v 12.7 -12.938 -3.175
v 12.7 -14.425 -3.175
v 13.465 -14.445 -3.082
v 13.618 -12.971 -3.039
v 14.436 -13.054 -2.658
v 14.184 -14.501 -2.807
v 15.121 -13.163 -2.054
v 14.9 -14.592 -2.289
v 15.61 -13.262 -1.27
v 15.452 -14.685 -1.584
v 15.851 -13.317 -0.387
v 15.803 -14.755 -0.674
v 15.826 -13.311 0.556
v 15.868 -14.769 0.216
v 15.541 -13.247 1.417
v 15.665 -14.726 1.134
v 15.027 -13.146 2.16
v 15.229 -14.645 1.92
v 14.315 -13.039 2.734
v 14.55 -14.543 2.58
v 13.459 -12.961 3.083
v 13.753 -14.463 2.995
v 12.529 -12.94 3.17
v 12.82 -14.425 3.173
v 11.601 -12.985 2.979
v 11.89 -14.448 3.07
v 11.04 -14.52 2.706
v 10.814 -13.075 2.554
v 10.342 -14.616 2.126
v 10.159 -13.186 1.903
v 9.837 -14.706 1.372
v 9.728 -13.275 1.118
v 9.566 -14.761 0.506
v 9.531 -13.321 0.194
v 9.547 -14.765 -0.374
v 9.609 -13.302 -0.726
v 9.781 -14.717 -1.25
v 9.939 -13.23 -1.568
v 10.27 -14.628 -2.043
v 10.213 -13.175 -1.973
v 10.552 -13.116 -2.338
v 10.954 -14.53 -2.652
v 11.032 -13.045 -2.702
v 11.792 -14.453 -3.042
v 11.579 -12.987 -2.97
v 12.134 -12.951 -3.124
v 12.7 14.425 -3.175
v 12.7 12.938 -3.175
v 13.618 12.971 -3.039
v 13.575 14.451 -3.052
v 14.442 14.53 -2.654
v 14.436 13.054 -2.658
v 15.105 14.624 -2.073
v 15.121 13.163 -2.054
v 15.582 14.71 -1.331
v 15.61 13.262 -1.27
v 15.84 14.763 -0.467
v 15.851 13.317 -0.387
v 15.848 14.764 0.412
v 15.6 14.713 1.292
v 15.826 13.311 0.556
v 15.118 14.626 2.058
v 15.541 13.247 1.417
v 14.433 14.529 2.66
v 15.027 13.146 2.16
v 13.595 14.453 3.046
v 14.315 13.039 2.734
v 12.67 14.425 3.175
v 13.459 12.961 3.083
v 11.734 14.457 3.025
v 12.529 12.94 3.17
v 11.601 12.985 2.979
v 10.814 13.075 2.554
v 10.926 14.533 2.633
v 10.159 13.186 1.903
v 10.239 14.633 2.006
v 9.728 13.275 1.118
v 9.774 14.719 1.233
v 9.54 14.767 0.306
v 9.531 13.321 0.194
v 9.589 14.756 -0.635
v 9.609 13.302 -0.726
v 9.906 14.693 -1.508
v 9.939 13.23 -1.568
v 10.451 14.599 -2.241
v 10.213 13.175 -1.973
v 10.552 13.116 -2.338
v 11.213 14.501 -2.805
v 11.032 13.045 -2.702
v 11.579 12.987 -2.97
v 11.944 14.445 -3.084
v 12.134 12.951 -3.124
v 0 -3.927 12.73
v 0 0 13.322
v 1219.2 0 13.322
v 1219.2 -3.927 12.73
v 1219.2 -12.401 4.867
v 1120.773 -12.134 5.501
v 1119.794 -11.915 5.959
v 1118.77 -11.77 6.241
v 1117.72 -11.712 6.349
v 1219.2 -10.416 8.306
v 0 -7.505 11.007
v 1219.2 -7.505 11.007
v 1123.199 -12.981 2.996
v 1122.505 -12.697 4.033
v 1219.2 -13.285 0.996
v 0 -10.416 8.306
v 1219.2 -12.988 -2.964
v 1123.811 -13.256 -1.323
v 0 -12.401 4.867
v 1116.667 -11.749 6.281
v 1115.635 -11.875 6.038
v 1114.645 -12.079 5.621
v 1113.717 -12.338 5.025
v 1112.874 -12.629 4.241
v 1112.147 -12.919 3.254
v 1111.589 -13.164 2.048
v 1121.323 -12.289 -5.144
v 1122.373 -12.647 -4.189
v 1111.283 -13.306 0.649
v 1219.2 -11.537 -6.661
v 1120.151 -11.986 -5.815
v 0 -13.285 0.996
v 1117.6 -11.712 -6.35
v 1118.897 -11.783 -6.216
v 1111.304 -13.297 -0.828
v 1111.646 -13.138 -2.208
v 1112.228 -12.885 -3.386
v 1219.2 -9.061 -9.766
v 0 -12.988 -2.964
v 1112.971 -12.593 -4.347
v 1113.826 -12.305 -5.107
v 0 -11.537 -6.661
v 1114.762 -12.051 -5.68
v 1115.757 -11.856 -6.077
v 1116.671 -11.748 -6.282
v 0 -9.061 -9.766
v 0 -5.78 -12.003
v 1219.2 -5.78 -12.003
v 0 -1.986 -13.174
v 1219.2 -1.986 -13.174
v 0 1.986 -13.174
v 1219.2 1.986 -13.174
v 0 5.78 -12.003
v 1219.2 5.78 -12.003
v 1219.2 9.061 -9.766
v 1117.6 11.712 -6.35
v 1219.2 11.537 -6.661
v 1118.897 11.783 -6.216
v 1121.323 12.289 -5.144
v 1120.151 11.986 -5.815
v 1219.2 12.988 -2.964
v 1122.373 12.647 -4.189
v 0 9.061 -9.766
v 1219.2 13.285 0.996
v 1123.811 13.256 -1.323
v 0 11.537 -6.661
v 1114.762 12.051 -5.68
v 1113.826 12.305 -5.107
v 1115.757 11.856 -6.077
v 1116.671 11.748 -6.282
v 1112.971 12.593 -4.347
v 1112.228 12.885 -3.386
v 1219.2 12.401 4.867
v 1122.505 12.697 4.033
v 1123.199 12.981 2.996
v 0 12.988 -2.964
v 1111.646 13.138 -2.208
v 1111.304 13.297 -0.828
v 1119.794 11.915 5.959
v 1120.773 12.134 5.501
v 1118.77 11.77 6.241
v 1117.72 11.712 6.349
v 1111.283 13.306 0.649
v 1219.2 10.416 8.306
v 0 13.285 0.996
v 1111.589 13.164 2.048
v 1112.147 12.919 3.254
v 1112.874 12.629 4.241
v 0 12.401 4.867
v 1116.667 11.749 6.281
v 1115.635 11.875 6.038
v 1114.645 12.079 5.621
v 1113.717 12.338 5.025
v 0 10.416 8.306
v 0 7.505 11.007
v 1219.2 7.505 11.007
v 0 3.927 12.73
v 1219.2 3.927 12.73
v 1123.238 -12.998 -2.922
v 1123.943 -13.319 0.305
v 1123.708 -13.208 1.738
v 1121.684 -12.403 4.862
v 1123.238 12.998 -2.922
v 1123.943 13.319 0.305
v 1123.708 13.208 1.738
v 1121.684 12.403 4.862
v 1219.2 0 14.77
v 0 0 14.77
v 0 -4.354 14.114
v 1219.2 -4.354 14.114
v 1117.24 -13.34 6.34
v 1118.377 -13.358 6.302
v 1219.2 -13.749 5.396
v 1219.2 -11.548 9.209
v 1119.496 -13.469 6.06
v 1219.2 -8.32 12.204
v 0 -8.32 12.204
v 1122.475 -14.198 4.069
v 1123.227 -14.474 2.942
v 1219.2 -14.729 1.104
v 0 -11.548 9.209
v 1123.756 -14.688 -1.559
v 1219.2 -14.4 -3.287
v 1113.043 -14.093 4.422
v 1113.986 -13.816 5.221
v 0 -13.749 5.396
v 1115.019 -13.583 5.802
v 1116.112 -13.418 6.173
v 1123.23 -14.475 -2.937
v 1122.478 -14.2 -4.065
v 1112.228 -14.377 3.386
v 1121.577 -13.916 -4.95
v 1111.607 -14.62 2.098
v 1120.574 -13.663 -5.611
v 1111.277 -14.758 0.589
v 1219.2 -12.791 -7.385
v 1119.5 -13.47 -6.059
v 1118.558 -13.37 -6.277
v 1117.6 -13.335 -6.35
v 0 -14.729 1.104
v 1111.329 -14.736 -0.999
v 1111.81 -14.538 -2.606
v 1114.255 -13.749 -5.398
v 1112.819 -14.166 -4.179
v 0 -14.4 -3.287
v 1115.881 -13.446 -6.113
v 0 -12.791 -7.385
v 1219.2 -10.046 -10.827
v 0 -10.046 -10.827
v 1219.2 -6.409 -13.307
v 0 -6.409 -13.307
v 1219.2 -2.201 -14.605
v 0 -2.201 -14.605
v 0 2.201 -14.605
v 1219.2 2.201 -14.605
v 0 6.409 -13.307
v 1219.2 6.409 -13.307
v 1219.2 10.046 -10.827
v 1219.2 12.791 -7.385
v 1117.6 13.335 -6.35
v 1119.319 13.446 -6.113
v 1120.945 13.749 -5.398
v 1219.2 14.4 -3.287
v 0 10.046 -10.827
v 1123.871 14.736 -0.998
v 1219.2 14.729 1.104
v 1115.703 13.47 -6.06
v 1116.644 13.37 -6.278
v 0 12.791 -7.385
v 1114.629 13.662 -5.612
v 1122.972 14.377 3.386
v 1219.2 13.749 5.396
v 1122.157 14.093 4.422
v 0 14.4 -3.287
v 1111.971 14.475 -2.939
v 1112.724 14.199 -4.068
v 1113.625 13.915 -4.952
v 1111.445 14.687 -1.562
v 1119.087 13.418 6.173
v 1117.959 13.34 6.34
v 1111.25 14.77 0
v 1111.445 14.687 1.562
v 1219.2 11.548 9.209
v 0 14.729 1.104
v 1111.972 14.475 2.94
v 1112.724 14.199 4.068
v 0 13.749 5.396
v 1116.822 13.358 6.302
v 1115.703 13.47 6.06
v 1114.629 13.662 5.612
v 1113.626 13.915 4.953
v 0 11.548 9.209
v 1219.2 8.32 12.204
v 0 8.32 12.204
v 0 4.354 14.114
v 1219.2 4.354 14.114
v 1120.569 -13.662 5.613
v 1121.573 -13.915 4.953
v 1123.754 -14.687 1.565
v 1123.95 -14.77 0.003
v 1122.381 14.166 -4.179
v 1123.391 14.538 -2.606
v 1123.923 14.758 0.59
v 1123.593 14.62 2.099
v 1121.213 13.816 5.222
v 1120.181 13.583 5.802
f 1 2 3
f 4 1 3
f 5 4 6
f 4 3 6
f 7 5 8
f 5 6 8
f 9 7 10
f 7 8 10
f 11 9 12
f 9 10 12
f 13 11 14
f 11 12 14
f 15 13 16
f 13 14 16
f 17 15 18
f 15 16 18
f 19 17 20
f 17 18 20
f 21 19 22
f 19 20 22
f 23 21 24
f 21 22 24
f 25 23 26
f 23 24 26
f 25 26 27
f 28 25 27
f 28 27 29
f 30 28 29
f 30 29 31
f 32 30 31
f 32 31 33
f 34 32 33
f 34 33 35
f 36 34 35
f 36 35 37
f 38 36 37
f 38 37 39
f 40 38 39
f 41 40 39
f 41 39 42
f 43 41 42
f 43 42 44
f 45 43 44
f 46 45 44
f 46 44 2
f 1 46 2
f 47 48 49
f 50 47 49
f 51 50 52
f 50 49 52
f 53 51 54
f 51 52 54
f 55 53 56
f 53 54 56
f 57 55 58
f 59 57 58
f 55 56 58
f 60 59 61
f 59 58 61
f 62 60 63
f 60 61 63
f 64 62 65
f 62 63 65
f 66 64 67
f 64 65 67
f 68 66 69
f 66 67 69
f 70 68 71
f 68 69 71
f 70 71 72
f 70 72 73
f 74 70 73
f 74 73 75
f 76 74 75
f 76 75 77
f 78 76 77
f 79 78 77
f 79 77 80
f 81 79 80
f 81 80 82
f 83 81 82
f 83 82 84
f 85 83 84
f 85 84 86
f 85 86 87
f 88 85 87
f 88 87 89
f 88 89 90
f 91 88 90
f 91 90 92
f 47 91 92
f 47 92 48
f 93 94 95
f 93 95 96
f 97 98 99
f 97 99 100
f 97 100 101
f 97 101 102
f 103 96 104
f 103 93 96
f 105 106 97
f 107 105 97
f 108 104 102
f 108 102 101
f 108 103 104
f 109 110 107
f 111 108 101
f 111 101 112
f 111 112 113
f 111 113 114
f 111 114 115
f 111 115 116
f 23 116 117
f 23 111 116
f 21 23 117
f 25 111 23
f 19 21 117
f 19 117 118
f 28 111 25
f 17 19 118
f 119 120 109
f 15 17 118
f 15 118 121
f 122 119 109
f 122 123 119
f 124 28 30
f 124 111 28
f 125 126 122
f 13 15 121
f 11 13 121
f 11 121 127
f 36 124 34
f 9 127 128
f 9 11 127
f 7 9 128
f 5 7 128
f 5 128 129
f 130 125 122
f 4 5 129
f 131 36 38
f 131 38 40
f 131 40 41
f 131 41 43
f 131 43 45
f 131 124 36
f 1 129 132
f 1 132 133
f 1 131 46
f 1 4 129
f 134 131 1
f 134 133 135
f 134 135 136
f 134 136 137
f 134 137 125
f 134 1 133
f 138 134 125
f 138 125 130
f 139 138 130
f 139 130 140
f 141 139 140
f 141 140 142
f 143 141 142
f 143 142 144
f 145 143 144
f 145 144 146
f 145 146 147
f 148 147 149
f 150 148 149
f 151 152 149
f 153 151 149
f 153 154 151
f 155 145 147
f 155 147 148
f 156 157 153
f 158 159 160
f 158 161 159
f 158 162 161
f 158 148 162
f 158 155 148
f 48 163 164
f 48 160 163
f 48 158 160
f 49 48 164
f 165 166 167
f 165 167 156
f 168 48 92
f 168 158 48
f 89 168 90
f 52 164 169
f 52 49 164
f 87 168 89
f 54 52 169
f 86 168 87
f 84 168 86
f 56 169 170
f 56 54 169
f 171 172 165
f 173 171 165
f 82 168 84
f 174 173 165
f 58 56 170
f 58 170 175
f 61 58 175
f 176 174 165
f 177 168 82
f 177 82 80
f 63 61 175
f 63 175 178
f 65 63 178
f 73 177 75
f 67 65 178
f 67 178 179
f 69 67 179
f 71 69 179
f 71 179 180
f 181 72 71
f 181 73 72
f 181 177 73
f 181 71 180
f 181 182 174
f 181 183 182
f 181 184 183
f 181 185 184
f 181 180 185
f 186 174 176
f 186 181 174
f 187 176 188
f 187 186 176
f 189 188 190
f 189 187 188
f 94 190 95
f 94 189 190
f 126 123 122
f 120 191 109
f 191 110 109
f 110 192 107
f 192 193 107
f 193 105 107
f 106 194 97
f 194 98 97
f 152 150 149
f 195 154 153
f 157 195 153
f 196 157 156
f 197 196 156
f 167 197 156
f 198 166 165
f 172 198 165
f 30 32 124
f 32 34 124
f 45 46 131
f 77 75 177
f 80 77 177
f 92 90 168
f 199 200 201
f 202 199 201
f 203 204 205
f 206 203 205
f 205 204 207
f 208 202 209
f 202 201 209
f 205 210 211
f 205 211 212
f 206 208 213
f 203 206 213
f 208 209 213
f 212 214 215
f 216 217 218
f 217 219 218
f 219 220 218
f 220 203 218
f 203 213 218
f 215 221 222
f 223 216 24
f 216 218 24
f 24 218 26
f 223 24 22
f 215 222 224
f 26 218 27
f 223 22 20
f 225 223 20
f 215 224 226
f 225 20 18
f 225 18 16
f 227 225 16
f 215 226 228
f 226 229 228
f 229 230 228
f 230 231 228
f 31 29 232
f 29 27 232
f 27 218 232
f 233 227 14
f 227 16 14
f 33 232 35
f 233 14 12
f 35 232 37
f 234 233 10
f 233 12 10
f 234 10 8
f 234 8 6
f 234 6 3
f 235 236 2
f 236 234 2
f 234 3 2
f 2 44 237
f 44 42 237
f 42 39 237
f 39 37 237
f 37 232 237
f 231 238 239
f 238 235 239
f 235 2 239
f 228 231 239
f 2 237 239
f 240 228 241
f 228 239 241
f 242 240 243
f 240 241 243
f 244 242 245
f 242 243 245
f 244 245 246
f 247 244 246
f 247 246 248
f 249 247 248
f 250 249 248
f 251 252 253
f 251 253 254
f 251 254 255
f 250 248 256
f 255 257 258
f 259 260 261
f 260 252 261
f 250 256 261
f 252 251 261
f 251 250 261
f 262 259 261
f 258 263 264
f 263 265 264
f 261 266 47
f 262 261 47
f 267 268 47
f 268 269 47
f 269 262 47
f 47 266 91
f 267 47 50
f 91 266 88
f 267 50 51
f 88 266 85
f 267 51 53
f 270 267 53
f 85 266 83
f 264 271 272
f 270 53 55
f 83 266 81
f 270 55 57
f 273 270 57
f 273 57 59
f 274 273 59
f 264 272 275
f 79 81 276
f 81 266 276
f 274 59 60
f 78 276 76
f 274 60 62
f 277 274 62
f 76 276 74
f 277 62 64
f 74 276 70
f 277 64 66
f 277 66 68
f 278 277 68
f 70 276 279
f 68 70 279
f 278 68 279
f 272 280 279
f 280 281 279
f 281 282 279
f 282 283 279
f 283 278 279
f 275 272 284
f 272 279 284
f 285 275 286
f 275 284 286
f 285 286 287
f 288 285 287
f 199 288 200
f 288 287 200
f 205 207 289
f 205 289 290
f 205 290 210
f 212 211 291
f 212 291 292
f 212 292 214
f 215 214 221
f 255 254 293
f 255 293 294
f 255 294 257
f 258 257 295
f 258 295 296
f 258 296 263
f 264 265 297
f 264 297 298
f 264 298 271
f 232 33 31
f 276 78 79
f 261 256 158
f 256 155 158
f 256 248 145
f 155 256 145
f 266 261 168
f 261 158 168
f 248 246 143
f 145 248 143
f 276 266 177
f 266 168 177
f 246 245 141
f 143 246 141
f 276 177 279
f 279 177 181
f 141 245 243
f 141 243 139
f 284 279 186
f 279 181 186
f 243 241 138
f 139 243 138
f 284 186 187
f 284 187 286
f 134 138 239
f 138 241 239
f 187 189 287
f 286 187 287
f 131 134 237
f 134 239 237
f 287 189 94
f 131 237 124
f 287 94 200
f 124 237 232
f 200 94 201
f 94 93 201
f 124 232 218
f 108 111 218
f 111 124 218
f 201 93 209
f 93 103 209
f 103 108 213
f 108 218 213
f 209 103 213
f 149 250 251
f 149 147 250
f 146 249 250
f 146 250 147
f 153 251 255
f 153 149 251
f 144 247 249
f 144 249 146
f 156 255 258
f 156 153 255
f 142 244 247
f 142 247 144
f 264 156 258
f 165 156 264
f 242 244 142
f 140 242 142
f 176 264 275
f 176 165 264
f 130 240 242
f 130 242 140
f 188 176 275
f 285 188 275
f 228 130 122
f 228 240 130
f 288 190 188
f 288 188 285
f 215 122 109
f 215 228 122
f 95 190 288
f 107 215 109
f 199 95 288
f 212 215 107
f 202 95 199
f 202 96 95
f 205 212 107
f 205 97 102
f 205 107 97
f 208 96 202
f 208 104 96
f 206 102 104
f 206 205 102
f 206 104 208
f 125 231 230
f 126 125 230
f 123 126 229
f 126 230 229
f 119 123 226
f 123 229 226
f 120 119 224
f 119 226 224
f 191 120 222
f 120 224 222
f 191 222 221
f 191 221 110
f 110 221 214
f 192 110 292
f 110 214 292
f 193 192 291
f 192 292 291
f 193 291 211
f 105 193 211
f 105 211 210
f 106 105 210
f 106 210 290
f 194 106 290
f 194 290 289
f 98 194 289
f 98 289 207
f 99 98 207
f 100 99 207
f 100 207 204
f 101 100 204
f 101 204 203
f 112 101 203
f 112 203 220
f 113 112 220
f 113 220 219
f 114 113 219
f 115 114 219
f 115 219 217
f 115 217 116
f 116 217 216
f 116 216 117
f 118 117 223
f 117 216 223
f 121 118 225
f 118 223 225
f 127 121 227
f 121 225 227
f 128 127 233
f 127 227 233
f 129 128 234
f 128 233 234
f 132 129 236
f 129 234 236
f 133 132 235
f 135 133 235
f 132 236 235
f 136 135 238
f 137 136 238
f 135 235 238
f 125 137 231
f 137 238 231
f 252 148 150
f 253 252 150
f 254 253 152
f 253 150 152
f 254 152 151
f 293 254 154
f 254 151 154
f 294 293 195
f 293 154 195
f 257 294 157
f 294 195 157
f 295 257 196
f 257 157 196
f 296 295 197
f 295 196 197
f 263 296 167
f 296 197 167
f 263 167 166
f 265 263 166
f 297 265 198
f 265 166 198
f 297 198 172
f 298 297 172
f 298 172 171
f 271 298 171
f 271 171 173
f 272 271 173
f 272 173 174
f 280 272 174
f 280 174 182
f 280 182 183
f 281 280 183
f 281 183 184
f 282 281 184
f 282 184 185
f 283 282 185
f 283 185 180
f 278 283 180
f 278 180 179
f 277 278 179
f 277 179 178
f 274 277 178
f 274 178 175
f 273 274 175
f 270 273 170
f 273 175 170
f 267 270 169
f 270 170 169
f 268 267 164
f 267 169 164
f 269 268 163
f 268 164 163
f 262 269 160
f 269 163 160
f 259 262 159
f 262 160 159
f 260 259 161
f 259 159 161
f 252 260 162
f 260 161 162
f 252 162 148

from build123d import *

# Parameters (mm, degrees)
SKETCH3_R           = 14.7701
SKETCH3_R_2         = 13.3223
BOSS_EXTRUDE1_DEPTH = 1219.2
SKETCH6_R           = 6.35
SKETCH6_R_2         = 3.175
CUT_EXTRUDE2_DEPTH  = 1220.647251983


with BuildPart() as part:
    # Sketch3 → Boss-Extrude1 (new body)
    with BuildSketch(Plane(origin=(0, 0, 0), x_dir=(0, 0, -1), z_dir=(1, 0, 0))):
        with Locations(Location((0, 0, 0), (0, 0, 180))):
            Circle(SKETCH3_R)
        with Locations(Location((0, 0, 0), (0, 0, 180))):
            Circle(SKETCH3_R_2, mode=Mode.SUBTRACT)
    extrude(amount=BOSS_EXTRUDE1_DEPTH)

    # Sketch6 → Cut-Extrude2 (cut, through all)
    with BuildSketch(Plane(origin=(0, -14.7701, 0), x_dir=(-1, 0, 0), z_dir=(0, -1, 0))):
        with Locations(Location((-1117.6, 0, 0), (0, 0, 90))):
            Circle(SKETCH6_R)
        with Locations(Location((-12.7, 0, 0), (0, 0, 90))):
            Circle(SKETCH6_R_2)
    extrude(amount=-CUT_EXTRUDE2_DEPTH, mode=Mode.SUBTRACT)


solid = part.part
